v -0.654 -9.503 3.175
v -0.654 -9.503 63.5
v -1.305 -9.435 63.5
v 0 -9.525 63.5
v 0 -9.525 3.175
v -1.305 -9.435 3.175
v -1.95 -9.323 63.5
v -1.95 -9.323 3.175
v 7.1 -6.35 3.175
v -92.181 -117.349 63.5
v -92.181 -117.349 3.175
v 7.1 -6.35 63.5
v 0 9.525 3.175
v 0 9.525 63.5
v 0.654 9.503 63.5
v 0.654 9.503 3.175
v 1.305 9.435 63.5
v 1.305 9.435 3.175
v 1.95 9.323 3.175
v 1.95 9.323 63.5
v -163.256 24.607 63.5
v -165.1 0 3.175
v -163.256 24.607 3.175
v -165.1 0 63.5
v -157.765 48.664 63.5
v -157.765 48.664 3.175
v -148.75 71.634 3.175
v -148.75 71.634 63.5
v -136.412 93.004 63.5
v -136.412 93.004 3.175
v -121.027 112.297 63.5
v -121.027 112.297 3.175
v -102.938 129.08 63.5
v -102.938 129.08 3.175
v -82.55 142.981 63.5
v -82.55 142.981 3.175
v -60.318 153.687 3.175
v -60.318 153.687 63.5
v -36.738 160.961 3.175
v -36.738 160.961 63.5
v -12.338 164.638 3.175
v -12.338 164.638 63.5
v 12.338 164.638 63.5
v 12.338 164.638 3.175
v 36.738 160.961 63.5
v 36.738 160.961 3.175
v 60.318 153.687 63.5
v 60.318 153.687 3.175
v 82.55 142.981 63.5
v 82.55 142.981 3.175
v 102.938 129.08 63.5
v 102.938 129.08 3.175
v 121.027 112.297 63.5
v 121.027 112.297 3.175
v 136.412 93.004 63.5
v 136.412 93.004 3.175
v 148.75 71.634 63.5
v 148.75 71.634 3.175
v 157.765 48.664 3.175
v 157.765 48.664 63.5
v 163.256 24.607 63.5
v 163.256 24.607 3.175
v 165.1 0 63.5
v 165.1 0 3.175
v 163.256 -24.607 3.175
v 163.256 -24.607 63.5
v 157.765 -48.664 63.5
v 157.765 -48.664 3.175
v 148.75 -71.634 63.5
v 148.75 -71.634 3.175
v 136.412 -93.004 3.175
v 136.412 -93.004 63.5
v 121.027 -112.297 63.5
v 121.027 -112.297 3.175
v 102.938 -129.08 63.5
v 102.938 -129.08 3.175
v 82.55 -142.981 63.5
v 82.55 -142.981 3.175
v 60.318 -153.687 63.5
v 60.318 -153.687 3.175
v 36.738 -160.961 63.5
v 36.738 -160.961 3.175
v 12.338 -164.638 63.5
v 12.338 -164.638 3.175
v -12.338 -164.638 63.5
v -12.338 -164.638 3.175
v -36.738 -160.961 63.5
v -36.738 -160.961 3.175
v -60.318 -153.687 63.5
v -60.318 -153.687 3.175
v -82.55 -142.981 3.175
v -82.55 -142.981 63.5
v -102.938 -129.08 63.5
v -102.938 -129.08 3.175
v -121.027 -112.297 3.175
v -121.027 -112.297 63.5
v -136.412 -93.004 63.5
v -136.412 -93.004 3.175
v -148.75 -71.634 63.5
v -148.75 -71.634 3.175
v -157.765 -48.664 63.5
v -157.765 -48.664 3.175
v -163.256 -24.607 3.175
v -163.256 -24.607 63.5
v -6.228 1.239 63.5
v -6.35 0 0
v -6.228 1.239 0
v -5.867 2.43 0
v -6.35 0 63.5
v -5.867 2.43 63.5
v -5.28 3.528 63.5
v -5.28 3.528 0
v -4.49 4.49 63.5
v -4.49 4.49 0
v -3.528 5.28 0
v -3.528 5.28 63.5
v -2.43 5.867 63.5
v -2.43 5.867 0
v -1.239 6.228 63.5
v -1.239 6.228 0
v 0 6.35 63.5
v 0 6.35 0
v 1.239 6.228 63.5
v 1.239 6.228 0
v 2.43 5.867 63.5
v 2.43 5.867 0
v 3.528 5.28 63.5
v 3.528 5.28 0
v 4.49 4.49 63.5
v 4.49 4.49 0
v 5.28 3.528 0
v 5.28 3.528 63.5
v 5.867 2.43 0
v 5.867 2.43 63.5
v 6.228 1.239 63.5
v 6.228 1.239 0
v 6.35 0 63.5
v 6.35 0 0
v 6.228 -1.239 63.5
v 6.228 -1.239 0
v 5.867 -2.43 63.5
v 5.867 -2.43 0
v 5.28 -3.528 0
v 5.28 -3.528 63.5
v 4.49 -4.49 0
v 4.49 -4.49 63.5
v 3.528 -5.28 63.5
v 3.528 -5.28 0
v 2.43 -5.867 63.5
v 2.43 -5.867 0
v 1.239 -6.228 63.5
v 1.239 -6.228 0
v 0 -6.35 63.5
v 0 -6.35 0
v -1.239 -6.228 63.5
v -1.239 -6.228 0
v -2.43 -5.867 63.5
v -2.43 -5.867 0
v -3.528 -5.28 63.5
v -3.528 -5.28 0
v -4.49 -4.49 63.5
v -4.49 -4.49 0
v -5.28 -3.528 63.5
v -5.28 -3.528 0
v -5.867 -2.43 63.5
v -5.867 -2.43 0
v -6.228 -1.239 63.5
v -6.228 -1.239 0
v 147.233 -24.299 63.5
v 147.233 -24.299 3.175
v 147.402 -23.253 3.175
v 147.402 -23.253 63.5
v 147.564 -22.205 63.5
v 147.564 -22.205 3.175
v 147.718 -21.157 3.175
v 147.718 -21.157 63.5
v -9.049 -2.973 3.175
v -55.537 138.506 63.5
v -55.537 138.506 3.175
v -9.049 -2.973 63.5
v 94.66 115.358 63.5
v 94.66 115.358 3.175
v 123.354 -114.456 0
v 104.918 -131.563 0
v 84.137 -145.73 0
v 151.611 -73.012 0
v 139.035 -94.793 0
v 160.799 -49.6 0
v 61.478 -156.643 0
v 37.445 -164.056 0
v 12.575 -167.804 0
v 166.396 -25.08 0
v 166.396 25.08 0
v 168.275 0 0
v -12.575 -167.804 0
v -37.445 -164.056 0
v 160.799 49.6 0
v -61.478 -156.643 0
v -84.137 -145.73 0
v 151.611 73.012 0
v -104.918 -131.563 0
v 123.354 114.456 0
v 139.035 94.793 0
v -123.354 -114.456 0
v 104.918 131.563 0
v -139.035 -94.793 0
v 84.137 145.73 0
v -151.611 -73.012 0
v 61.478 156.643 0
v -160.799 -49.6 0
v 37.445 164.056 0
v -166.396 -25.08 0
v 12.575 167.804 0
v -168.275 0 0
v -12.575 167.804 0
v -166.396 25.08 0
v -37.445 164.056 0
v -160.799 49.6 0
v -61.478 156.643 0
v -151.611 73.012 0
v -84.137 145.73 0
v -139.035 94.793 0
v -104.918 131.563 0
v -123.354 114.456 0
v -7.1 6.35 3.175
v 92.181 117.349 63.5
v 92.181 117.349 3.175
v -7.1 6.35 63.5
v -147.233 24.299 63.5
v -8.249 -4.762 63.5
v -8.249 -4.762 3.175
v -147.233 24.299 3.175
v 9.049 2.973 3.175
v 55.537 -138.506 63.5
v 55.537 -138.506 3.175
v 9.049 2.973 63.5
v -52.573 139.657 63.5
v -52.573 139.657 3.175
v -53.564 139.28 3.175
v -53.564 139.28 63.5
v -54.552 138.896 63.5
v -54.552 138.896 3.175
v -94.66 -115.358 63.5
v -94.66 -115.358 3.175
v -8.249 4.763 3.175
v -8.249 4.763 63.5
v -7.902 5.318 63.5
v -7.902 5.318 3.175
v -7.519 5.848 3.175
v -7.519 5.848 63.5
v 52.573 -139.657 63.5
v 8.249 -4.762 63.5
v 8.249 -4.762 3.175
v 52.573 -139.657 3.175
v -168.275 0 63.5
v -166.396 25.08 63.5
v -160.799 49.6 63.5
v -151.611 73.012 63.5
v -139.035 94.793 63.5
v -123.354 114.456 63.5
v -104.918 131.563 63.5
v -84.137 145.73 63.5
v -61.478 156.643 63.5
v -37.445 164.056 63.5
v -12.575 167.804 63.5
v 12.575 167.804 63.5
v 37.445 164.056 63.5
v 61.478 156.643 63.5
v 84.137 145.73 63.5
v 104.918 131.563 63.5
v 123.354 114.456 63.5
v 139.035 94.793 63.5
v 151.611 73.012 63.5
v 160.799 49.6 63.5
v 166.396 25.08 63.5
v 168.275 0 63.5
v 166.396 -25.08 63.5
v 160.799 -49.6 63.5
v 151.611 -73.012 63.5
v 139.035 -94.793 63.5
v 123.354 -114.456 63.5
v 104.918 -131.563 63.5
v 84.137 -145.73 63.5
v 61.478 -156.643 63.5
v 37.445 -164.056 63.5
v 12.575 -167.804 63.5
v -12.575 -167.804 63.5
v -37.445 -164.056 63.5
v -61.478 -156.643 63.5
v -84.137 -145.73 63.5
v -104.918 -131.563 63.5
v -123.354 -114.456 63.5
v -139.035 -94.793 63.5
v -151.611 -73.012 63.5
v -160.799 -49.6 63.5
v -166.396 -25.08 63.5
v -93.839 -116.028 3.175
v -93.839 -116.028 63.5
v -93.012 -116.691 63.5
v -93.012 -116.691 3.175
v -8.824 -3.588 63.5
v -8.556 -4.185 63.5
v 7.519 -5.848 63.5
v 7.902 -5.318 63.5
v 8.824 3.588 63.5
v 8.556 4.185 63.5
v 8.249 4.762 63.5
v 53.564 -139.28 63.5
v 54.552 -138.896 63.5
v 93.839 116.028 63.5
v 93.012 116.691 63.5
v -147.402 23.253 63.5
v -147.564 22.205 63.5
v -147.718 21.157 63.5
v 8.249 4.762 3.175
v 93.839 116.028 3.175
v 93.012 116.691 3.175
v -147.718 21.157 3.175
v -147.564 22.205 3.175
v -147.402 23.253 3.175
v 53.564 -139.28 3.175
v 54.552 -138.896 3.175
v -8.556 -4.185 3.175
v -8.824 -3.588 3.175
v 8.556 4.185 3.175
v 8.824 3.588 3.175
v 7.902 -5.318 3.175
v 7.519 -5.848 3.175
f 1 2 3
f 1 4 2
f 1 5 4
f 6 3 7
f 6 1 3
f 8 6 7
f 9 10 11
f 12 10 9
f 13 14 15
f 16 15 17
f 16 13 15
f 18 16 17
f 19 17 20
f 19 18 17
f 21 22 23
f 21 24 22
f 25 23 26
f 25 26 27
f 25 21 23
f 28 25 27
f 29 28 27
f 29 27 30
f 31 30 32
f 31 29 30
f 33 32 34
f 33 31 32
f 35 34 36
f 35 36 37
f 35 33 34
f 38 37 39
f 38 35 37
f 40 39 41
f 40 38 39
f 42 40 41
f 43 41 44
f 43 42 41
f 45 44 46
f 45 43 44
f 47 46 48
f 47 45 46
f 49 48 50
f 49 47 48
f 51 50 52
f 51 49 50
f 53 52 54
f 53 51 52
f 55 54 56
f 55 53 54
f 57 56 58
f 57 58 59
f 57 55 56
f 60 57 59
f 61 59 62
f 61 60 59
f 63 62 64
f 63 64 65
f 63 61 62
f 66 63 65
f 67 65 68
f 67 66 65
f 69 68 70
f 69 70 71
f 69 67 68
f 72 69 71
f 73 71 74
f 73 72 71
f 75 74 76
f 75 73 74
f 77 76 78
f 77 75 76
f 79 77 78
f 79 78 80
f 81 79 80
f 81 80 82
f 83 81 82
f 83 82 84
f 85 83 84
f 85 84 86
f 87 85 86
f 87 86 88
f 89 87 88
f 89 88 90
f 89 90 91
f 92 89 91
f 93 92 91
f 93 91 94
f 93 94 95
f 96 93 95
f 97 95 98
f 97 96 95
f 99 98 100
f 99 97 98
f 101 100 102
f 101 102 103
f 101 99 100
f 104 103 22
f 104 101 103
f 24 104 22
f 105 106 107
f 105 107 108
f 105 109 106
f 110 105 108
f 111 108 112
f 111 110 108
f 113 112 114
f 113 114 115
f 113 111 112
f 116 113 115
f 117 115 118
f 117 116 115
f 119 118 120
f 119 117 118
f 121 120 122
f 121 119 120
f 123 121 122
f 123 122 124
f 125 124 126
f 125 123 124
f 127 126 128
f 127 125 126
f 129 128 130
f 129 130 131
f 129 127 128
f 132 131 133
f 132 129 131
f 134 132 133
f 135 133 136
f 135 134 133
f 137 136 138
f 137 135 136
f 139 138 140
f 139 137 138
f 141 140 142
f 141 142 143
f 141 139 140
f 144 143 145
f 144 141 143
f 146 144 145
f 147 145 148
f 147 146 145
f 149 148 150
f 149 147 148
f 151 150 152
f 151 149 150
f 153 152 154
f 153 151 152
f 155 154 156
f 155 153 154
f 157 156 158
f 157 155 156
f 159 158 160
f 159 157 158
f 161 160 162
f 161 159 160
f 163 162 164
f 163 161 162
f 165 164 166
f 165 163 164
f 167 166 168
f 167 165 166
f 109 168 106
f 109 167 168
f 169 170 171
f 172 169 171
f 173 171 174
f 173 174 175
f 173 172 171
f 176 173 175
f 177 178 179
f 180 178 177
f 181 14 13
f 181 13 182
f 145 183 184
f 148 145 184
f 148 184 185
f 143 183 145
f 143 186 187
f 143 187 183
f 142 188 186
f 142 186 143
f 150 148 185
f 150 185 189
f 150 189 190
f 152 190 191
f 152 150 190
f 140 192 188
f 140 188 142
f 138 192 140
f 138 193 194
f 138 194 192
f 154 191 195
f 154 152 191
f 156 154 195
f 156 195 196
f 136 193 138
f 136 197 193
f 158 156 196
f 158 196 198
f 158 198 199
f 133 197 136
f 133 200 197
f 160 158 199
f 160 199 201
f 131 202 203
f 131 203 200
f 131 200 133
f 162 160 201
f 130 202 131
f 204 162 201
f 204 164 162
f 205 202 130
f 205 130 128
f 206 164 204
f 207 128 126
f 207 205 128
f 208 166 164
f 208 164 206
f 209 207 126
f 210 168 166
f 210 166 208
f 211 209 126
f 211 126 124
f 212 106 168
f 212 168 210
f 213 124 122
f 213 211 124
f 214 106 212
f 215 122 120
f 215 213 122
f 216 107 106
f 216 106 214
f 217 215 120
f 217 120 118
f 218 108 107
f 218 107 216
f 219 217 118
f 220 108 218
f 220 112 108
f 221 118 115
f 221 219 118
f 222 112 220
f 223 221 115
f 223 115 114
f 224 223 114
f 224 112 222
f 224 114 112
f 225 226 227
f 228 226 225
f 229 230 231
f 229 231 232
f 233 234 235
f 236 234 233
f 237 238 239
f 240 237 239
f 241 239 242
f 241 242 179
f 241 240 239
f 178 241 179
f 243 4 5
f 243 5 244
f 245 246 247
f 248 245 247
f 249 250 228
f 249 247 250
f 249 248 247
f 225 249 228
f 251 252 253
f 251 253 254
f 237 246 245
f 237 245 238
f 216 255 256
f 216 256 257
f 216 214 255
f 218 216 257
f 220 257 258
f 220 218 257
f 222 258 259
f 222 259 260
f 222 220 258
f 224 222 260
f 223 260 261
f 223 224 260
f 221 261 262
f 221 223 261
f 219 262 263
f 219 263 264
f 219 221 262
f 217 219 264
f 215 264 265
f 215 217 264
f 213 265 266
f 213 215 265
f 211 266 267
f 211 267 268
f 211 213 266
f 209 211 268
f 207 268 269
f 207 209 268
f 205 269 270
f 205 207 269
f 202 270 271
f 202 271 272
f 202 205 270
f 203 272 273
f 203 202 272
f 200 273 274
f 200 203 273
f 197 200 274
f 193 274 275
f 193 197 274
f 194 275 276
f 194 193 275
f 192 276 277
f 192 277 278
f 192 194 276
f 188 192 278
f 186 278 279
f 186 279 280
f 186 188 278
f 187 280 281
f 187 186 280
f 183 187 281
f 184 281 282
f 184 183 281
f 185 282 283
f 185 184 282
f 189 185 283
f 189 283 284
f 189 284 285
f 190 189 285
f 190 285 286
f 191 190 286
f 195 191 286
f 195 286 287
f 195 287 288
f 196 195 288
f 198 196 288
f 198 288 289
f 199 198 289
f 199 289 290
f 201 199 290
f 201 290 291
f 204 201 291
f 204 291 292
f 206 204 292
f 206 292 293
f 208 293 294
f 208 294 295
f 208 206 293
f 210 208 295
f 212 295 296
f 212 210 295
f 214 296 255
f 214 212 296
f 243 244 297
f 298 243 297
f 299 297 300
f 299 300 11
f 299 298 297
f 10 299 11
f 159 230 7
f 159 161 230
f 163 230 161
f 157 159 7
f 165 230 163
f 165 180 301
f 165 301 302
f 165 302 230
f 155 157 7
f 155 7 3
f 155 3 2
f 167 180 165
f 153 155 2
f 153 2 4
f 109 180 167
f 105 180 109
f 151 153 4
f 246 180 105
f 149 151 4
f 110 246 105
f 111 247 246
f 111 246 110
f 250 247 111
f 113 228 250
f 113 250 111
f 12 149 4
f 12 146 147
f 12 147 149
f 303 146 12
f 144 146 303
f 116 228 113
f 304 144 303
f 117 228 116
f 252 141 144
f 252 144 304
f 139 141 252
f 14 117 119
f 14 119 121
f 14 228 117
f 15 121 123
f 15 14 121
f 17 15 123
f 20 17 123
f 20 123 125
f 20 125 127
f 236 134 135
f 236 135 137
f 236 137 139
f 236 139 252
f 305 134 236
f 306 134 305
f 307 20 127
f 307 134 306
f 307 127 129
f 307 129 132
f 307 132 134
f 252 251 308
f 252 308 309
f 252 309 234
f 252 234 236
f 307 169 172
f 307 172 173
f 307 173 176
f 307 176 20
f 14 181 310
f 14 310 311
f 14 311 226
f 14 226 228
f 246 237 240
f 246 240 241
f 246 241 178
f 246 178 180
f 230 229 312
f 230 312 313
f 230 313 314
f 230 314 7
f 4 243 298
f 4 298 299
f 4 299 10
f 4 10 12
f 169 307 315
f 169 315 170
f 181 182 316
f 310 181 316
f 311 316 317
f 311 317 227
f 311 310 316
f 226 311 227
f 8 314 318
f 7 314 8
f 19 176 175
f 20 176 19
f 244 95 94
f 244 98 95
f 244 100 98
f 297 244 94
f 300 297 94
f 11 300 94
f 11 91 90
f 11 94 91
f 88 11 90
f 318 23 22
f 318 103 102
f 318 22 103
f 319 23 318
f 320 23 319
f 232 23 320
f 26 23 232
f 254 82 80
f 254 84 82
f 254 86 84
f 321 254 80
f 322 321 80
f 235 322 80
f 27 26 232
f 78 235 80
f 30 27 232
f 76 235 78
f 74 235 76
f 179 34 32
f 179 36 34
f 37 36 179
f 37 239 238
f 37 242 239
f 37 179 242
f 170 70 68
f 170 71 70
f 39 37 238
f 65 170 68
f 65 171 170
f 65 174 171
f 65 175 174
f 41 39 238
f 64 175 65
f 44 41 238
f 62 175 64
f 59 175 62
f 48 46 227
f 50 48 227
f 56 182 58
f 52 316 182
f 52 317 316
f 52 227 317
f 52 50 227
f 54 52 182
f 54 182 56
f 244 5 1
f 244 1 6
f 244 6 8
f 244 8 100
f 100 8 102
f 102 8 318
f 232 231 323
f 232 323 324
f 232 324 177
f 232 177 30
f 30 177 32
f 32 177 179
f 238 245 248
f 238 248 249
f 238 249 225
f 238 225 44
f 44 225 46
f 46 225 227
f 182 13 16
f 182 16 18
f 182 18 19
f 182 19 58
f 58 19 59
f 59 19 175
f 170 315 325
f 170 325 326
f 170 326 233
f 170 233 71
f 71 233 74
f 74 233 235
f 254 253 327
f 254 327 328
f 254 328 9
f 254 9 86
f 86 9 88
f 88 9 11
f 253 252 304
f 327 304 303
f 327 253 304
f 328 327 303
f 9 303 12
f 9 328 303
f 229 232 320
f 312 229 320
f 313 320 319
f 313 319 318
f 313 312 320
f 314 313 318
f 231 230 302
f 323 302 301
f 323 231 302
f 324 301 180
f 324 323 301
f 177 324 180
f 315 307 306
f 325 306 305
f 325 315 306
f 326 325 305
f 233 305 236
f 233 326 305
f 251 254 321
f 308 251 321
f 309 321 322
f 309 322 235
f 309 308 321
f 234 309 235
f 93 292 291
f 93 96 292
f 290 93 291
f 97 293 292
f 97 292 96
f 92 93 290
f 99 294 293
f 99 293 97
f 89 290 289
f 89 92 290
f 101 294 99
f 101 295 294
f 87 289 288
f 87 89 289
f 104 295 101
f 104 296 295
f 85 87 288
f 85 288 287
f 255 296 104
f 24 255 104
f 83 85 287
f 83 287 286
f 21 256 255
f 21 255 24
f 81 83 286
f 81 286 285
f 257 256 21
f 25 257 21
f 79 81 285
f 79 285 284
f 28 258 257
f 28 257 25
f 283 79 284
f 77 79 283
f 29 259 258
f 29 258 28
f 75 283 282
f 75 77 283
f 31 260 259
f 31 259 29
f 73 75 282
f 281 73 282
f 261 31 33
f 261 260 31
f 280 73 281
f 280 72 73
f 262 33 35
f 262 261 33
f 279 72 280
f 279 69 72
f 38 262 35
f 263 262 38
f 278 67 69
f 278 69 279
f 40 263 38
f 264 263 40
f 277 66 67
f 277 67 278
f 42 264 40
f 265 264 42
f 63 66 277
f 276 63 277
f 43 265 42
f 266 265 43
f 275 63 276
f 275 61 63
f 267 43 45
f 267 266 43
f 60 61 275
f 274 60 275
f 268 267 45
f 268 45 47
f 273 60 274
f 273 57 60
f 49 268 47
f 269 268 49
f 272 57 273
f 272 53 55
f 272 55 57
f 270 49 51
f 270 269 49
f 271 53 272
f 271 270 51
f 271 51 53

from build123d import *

# Parameters (mm, degrees)
F4_DEPTH        = 60.325
F4_COPIES_COUNT = 6


# Not quite as in the source:
# - a pattern or mirror of a feature is missing from the dataset's text; its kind, count and spacing are read off the source's solid


with BuildPart() as f2:
    # F0 (on Front) → F2 (revolve)
    with BuildSketch(Plane.XZ):
        Polygon((-9.525, 0), (-6.35, 0), (-6.35, 63.5), (-9.525, 63.5), (-9.525, 38.1), (-9.525, 3.175), (-18.9311246582, 3.175), (-139.6226100799, 3.175), (-165.1, 3.175), (-165.1, 38.1), (-165.1, 63.5), (-168.275, 63.5), (-168.275, 0), (-165.1, 0), (-139.7, 0), (-19.05, 0), align=None)
    revolve(axis=Axis((0, 0, 2.6372056454), (0, 0, -1)))

    # F3 (on face) → F4 (join, through all)
    with BuildSketch(Plane.XY.offset(63.5)):
        with BuildLine():
            Line((-92.1809510877, -117.3489364313), (7.0995158286, -6.35))
            ThreePointArc((7.0995158286, -6.35), (3.8885649667, -8.6950956004), (0, -9.525))
            Line((0, -9.525), (-94.6602110475, -115.3583333333))
            ThreePointArc((-94.6602110475, -115.3583333333), (-93.4258828815, -116.3602381951), (-92.1809510877, -117.3489364313))
        make_face()
    f4 = extrude(amount=-F4_DEPTH)

    # F4_copies: F4 ×6 about axis
    f4_copies_axis = Axis((0, 0, 0), (0, 0, 1))
    for i in range(1, F4_COPIES_COUNT):
        add(f4.rotate(f4_copies_axis, i * 360 / F4_COPIES_COUNT))


solid = f2.part
